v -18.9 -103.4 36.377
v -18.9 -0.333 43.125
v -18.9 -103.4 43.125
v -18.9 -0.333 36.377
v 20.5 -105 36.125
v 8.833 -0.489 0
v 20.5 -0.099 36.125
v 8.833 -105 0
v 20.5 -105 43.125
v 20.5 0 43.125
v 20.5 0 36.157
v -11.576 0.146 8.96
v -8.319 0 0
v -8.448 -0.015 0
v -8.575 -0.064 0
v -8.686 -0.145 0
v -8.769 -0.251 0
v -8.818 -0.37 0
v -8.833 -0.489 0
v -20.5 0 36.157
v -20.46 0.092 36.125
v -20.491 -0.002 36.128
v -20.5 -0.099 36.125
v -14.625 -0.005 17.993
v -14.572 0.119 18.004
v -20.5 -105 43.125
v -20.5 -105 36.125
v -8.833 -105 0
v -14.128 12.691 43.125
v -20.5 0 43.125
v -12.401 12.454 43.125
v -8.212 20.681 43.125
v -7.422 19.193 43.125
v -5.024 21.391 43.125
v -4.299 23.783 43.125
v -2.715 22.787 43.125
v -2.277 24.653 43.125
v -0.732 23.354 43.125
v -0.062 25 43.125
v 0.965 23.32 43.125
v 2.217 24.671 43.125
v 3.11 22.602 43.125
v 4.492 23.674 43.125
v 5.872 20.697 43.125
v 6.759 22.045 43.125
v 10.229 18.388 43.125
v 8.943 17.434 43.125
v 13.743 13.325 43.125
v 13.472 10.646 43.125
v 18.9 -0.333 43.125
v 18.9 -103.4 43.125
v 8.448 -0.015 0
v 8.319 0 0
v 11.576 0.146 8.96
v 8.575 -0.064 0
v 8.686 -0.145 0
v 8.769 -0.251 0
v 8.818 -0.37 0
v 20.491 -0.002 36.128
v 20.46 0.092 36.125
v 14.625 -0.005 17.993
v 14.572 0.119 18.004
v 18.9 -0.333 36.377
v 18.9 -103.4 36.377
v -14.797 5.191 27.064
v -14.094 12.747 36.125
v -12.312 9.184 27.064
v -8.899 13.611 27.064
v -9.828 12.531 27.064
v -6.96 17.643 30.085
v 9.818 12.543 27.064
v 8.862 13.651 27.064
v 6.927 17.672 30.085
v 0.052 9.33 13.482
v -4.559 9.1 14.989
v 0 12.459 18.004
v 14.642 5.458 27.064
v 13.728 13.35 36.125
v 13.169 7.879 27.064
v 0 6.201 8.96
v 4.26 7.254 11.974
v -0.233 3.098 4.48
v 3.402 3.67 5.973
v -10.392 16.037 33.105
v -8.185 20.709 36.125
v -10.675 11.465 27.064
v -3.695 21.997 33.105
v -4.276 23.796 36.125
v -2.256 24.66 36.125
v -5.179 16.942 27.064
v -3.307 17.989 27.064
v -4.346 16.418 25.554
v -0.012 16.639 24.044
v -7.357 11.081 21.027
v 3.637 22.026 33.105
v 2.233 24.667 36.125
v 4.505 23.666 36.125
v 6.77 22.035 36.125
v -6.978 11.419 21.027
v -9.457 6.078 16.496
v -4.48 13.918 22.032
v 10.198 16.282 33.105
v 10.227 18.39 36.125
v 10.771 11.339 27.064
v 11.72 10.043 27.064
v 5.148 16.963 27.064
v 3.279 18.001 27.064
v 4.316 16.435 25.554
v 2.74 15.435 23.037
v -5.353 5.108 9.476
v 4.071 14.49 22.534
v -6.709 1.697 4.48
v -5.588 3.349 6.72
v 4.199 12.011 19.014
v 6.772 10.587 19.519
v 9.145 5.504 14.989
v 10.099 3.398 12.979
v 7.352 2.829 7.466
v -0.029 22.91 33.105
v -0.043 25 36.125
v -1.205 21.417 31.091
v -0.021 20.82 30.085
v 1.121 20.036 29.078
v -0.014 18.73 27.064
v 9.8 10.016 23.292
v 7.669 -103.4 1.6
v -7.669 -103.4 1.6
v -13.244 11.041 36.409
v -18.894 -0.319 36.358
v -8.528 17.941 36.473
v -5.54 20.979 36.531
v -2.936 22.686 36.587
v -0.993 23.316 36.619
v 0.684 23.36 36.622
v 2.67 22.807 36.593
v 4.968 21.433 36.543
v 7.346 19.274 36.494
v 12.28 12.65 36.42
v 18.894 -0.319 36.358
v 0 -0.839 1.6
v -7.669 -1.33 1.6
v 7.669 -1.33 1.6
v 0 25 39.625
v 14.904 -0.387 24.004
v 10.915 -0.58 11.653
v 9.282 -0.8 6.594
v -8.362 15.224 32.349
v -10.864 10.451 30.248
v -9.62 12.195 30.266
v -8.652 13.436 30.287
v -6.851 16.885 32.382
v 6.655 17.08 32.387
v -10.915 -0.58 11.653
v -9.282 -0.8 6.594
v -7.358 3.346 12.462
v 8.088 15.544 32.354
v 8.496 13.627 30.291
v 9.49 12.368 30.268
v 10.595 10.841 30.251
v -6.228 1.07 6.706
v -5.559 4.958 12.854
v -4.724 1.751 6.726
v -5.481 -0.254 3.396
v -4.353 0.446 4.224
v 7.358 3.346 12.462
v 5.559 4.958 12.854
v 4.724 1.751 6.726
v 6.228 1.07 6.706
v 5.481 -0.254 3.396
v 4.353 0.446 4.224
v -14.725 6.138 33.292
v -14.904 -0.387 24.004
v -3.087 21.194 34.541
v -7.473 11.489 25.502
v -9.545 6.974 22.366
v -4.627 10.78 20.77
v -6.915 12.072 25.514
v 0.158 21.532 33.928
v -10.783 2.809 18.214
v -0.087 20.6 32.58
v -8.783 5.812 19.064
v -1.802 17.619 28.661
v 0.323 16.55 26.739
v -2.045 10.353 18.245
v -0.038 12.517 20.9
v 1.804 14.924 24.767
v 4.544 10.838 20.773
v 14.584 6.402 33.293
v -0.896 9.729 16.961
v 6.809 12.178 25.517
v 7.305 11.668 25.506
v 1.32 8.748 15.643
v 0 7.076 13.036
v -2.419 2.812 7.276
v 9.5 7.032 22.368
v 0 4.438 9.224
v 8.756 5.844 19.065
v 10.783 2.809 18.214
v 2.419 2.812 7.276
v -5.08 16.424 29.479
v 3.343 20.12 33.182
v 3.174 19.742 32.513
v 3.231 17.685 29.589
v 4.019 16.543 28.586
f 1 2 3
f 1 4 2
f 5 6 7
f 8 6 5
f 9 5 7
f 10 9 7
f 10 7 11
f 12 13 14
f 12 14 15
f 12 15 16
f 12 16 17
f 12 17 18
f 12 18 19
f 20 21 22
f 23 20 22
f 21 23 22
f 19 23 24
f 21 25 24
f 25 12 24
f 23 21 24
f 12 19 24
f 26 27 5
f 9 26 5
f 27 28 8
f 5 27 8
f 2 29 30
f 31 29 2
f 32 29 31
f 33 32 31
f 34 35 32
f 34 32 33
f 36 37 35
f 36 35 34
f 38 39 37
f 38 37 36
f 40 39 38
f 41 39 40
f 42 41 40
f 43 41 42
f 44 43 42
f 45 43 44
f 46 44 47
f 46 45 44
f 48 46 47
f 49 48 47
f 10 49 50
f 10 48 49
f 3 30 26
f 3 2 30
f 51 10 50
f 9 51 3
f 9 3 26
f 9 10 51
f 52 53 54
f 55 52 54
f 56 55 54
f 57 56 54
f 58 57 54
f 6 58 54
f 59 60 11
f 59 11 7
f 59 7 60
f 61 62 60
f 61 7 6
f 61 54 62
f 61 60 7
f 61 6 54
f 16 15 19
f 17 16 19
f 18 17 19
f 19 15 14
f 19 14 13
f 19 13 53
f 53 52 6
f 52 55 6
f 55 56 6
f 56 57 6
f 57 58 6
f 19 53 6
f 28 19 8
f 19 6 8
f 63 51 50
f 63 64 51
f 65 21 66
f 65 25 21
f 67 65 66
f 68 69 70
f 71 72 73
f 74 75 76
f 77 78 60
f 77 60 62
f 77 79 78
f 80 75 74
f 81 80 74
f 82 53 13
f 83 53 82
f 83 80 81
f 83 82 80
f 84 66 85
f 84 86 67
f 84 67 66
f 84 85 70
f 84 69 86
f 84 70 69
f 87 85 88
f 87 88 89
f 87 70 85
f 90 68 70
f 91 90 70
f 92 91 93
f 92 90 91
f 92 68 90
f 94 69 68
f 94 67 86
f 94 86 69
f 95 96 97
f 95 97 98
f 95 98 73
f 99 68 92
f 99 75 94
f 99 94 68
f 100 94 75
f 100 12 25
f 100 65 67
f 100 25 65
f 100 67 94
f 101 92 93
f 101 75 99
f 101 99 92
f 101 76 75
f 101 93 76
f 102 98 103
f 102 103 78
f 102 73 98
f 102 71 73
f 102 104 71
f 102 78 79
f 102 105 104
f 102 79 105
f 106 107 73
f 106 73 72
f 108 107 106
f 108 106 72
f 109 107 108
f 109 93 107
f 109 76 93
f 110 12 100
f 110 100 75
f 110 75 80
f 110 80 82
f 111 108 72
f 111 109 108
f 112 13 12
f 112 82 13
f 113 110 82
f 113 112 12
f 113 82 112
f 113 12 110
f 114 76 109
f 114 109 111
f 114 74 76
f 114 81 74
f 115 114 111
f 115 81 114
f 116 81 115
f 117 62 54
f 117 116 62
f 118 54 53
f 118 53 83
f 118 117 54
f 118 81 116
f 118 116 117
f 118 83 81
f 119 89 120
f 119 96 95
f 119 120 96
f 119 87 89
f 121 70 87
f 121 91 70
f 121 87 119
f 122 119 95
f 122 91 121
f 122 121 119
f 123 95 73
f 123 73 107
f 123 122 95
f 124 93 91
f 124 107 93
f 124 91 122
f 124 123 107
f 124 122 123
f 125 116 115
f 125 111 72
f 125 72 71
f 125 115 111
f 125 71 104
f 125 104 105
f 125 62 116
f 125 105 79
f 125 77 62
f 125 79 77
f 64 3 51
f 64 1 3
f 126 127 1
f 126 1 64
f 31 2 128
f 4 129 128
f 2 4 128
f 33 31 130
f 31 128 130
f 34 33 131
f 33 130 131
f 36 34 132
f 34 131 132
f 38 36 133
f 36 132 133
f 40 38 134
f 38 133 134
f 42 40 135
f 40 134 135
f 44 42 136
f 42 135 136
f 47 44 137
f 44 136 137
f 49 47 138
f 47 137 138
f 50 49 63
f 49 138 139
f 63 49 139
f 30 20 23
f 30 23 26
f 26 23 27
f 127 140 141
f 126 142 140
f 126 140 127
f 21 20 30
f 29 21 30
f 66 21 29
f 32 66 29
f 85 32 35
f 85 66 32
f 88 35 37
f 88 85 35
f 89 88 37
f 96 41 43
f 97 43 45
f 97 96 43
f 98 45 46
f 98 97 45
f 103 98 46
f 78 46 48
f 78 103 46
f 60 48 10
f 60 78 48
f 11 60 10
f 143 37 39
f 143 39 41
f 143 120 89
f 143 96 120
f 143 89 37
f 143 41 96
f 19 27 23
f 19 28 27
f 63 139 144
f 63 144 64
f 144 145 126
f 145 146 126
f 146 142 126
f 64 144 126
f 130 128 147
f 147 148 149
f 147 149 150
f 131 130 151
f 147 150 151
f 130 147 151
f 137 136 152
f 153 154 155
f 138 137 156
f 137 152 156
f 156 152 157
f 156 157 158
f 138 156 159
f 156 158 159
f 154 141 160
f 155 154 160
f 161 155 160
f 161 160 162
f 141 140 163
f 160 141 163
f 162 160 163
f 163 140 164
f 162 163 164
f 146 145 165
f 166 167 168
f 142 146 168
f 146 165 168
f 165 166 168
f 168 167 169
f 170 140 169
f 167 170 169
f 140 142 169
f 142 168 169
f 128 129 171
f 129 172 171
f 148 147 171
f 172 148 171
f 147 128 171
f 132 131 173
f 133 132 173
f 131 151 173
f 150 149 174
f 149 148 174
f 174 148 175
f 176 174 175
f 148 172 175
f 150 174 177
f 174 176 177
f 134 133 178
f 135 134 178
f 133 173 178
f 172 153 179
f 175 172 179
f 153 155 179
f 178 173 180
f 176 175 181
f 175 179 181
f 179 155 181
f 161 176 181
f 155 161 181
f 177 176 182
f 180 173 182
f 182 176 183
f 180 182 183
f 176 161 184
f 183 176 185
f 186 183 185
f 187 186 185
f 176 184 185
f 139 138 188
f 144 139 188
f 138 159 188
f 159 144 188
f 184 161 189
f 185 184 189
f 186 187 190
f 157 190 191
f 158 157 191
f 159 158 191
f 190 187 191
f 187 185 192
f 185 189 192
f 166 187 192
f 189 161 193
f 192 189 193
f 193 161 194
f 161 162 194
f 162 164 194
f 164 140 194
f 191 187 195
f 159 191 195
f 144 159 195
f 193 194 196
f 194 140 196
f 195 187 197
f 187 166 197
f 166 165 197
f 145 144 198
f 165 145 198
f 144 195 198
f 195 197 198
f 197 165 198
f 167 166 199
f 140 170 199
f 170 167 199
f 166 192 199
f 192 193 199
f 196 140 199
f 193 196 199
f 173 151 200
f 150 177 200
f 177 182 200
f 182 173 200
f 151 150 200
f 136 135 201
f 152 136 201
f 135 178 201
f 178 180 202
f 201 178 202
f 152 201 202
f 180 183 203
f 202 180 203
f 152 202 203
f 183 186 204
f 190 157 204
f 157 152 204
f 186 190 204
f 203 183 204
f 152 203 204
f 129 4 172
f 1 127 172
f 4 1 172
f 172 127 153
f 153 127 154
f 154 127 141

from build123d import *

# Parameters (mm, degrees)
F2_W     = 17.66667
F2_H     = 105
F4_DEPTH = 7
F5_T     = -1.6
F6_R     = 0.5


with BuildPart() as f3:
    # F1 (on offset) → F3 section 0
    with BuildSketch(Plane.XY.offset(36.125)):
        with BuildLine():
            add(Edge.make_bspline(
                [(-20.5, 0), (-14, 15), (0, 35), (14, 15), (20.5, 0)],
                knots=[0, 0, 0, 0, 0.5, 1, 1, 1, 1], degree=3))
            Line((-20.5, 0), (-20.5, -105))
            Line((-20.5, -105), (20.5, -105))
            Line((20.5, -105), (20.5, 0))
        make_face()
    # F2 (on Top) → F3 section 1
    with BuildSketch(Plane.XY):
        with Locations((-3.5e-05, -52.5)):
            Rectangle(F2_W, F2_H)
    loft()

    # F4 (add): a face of the model
    f4_faces = [f3.faces().sort_by_distance(p)[0] for p in [
        (4.4104e-06, -44.0610349969, 36.125),
    ]]
    extrude(f4_faces, amount=F4_DEPTH)

    # F5
    f5_openings = [f3.faces().sort_by_distance(p)[0] for p in [
        (4e-06, -44.061035, 43.125),
    ]]
    offset(amount=F5_T, openings=f5_openings)

    # F6
    f6_edges = [f3.edges().sort_by_distance(p)[0] for p in [
        (14.66665, 0, 18.0625),
        (-14.666685, 0, 18.0625),
    ]]
    fillet(f6_edges, radius=F6_R)


solid = f3.part
